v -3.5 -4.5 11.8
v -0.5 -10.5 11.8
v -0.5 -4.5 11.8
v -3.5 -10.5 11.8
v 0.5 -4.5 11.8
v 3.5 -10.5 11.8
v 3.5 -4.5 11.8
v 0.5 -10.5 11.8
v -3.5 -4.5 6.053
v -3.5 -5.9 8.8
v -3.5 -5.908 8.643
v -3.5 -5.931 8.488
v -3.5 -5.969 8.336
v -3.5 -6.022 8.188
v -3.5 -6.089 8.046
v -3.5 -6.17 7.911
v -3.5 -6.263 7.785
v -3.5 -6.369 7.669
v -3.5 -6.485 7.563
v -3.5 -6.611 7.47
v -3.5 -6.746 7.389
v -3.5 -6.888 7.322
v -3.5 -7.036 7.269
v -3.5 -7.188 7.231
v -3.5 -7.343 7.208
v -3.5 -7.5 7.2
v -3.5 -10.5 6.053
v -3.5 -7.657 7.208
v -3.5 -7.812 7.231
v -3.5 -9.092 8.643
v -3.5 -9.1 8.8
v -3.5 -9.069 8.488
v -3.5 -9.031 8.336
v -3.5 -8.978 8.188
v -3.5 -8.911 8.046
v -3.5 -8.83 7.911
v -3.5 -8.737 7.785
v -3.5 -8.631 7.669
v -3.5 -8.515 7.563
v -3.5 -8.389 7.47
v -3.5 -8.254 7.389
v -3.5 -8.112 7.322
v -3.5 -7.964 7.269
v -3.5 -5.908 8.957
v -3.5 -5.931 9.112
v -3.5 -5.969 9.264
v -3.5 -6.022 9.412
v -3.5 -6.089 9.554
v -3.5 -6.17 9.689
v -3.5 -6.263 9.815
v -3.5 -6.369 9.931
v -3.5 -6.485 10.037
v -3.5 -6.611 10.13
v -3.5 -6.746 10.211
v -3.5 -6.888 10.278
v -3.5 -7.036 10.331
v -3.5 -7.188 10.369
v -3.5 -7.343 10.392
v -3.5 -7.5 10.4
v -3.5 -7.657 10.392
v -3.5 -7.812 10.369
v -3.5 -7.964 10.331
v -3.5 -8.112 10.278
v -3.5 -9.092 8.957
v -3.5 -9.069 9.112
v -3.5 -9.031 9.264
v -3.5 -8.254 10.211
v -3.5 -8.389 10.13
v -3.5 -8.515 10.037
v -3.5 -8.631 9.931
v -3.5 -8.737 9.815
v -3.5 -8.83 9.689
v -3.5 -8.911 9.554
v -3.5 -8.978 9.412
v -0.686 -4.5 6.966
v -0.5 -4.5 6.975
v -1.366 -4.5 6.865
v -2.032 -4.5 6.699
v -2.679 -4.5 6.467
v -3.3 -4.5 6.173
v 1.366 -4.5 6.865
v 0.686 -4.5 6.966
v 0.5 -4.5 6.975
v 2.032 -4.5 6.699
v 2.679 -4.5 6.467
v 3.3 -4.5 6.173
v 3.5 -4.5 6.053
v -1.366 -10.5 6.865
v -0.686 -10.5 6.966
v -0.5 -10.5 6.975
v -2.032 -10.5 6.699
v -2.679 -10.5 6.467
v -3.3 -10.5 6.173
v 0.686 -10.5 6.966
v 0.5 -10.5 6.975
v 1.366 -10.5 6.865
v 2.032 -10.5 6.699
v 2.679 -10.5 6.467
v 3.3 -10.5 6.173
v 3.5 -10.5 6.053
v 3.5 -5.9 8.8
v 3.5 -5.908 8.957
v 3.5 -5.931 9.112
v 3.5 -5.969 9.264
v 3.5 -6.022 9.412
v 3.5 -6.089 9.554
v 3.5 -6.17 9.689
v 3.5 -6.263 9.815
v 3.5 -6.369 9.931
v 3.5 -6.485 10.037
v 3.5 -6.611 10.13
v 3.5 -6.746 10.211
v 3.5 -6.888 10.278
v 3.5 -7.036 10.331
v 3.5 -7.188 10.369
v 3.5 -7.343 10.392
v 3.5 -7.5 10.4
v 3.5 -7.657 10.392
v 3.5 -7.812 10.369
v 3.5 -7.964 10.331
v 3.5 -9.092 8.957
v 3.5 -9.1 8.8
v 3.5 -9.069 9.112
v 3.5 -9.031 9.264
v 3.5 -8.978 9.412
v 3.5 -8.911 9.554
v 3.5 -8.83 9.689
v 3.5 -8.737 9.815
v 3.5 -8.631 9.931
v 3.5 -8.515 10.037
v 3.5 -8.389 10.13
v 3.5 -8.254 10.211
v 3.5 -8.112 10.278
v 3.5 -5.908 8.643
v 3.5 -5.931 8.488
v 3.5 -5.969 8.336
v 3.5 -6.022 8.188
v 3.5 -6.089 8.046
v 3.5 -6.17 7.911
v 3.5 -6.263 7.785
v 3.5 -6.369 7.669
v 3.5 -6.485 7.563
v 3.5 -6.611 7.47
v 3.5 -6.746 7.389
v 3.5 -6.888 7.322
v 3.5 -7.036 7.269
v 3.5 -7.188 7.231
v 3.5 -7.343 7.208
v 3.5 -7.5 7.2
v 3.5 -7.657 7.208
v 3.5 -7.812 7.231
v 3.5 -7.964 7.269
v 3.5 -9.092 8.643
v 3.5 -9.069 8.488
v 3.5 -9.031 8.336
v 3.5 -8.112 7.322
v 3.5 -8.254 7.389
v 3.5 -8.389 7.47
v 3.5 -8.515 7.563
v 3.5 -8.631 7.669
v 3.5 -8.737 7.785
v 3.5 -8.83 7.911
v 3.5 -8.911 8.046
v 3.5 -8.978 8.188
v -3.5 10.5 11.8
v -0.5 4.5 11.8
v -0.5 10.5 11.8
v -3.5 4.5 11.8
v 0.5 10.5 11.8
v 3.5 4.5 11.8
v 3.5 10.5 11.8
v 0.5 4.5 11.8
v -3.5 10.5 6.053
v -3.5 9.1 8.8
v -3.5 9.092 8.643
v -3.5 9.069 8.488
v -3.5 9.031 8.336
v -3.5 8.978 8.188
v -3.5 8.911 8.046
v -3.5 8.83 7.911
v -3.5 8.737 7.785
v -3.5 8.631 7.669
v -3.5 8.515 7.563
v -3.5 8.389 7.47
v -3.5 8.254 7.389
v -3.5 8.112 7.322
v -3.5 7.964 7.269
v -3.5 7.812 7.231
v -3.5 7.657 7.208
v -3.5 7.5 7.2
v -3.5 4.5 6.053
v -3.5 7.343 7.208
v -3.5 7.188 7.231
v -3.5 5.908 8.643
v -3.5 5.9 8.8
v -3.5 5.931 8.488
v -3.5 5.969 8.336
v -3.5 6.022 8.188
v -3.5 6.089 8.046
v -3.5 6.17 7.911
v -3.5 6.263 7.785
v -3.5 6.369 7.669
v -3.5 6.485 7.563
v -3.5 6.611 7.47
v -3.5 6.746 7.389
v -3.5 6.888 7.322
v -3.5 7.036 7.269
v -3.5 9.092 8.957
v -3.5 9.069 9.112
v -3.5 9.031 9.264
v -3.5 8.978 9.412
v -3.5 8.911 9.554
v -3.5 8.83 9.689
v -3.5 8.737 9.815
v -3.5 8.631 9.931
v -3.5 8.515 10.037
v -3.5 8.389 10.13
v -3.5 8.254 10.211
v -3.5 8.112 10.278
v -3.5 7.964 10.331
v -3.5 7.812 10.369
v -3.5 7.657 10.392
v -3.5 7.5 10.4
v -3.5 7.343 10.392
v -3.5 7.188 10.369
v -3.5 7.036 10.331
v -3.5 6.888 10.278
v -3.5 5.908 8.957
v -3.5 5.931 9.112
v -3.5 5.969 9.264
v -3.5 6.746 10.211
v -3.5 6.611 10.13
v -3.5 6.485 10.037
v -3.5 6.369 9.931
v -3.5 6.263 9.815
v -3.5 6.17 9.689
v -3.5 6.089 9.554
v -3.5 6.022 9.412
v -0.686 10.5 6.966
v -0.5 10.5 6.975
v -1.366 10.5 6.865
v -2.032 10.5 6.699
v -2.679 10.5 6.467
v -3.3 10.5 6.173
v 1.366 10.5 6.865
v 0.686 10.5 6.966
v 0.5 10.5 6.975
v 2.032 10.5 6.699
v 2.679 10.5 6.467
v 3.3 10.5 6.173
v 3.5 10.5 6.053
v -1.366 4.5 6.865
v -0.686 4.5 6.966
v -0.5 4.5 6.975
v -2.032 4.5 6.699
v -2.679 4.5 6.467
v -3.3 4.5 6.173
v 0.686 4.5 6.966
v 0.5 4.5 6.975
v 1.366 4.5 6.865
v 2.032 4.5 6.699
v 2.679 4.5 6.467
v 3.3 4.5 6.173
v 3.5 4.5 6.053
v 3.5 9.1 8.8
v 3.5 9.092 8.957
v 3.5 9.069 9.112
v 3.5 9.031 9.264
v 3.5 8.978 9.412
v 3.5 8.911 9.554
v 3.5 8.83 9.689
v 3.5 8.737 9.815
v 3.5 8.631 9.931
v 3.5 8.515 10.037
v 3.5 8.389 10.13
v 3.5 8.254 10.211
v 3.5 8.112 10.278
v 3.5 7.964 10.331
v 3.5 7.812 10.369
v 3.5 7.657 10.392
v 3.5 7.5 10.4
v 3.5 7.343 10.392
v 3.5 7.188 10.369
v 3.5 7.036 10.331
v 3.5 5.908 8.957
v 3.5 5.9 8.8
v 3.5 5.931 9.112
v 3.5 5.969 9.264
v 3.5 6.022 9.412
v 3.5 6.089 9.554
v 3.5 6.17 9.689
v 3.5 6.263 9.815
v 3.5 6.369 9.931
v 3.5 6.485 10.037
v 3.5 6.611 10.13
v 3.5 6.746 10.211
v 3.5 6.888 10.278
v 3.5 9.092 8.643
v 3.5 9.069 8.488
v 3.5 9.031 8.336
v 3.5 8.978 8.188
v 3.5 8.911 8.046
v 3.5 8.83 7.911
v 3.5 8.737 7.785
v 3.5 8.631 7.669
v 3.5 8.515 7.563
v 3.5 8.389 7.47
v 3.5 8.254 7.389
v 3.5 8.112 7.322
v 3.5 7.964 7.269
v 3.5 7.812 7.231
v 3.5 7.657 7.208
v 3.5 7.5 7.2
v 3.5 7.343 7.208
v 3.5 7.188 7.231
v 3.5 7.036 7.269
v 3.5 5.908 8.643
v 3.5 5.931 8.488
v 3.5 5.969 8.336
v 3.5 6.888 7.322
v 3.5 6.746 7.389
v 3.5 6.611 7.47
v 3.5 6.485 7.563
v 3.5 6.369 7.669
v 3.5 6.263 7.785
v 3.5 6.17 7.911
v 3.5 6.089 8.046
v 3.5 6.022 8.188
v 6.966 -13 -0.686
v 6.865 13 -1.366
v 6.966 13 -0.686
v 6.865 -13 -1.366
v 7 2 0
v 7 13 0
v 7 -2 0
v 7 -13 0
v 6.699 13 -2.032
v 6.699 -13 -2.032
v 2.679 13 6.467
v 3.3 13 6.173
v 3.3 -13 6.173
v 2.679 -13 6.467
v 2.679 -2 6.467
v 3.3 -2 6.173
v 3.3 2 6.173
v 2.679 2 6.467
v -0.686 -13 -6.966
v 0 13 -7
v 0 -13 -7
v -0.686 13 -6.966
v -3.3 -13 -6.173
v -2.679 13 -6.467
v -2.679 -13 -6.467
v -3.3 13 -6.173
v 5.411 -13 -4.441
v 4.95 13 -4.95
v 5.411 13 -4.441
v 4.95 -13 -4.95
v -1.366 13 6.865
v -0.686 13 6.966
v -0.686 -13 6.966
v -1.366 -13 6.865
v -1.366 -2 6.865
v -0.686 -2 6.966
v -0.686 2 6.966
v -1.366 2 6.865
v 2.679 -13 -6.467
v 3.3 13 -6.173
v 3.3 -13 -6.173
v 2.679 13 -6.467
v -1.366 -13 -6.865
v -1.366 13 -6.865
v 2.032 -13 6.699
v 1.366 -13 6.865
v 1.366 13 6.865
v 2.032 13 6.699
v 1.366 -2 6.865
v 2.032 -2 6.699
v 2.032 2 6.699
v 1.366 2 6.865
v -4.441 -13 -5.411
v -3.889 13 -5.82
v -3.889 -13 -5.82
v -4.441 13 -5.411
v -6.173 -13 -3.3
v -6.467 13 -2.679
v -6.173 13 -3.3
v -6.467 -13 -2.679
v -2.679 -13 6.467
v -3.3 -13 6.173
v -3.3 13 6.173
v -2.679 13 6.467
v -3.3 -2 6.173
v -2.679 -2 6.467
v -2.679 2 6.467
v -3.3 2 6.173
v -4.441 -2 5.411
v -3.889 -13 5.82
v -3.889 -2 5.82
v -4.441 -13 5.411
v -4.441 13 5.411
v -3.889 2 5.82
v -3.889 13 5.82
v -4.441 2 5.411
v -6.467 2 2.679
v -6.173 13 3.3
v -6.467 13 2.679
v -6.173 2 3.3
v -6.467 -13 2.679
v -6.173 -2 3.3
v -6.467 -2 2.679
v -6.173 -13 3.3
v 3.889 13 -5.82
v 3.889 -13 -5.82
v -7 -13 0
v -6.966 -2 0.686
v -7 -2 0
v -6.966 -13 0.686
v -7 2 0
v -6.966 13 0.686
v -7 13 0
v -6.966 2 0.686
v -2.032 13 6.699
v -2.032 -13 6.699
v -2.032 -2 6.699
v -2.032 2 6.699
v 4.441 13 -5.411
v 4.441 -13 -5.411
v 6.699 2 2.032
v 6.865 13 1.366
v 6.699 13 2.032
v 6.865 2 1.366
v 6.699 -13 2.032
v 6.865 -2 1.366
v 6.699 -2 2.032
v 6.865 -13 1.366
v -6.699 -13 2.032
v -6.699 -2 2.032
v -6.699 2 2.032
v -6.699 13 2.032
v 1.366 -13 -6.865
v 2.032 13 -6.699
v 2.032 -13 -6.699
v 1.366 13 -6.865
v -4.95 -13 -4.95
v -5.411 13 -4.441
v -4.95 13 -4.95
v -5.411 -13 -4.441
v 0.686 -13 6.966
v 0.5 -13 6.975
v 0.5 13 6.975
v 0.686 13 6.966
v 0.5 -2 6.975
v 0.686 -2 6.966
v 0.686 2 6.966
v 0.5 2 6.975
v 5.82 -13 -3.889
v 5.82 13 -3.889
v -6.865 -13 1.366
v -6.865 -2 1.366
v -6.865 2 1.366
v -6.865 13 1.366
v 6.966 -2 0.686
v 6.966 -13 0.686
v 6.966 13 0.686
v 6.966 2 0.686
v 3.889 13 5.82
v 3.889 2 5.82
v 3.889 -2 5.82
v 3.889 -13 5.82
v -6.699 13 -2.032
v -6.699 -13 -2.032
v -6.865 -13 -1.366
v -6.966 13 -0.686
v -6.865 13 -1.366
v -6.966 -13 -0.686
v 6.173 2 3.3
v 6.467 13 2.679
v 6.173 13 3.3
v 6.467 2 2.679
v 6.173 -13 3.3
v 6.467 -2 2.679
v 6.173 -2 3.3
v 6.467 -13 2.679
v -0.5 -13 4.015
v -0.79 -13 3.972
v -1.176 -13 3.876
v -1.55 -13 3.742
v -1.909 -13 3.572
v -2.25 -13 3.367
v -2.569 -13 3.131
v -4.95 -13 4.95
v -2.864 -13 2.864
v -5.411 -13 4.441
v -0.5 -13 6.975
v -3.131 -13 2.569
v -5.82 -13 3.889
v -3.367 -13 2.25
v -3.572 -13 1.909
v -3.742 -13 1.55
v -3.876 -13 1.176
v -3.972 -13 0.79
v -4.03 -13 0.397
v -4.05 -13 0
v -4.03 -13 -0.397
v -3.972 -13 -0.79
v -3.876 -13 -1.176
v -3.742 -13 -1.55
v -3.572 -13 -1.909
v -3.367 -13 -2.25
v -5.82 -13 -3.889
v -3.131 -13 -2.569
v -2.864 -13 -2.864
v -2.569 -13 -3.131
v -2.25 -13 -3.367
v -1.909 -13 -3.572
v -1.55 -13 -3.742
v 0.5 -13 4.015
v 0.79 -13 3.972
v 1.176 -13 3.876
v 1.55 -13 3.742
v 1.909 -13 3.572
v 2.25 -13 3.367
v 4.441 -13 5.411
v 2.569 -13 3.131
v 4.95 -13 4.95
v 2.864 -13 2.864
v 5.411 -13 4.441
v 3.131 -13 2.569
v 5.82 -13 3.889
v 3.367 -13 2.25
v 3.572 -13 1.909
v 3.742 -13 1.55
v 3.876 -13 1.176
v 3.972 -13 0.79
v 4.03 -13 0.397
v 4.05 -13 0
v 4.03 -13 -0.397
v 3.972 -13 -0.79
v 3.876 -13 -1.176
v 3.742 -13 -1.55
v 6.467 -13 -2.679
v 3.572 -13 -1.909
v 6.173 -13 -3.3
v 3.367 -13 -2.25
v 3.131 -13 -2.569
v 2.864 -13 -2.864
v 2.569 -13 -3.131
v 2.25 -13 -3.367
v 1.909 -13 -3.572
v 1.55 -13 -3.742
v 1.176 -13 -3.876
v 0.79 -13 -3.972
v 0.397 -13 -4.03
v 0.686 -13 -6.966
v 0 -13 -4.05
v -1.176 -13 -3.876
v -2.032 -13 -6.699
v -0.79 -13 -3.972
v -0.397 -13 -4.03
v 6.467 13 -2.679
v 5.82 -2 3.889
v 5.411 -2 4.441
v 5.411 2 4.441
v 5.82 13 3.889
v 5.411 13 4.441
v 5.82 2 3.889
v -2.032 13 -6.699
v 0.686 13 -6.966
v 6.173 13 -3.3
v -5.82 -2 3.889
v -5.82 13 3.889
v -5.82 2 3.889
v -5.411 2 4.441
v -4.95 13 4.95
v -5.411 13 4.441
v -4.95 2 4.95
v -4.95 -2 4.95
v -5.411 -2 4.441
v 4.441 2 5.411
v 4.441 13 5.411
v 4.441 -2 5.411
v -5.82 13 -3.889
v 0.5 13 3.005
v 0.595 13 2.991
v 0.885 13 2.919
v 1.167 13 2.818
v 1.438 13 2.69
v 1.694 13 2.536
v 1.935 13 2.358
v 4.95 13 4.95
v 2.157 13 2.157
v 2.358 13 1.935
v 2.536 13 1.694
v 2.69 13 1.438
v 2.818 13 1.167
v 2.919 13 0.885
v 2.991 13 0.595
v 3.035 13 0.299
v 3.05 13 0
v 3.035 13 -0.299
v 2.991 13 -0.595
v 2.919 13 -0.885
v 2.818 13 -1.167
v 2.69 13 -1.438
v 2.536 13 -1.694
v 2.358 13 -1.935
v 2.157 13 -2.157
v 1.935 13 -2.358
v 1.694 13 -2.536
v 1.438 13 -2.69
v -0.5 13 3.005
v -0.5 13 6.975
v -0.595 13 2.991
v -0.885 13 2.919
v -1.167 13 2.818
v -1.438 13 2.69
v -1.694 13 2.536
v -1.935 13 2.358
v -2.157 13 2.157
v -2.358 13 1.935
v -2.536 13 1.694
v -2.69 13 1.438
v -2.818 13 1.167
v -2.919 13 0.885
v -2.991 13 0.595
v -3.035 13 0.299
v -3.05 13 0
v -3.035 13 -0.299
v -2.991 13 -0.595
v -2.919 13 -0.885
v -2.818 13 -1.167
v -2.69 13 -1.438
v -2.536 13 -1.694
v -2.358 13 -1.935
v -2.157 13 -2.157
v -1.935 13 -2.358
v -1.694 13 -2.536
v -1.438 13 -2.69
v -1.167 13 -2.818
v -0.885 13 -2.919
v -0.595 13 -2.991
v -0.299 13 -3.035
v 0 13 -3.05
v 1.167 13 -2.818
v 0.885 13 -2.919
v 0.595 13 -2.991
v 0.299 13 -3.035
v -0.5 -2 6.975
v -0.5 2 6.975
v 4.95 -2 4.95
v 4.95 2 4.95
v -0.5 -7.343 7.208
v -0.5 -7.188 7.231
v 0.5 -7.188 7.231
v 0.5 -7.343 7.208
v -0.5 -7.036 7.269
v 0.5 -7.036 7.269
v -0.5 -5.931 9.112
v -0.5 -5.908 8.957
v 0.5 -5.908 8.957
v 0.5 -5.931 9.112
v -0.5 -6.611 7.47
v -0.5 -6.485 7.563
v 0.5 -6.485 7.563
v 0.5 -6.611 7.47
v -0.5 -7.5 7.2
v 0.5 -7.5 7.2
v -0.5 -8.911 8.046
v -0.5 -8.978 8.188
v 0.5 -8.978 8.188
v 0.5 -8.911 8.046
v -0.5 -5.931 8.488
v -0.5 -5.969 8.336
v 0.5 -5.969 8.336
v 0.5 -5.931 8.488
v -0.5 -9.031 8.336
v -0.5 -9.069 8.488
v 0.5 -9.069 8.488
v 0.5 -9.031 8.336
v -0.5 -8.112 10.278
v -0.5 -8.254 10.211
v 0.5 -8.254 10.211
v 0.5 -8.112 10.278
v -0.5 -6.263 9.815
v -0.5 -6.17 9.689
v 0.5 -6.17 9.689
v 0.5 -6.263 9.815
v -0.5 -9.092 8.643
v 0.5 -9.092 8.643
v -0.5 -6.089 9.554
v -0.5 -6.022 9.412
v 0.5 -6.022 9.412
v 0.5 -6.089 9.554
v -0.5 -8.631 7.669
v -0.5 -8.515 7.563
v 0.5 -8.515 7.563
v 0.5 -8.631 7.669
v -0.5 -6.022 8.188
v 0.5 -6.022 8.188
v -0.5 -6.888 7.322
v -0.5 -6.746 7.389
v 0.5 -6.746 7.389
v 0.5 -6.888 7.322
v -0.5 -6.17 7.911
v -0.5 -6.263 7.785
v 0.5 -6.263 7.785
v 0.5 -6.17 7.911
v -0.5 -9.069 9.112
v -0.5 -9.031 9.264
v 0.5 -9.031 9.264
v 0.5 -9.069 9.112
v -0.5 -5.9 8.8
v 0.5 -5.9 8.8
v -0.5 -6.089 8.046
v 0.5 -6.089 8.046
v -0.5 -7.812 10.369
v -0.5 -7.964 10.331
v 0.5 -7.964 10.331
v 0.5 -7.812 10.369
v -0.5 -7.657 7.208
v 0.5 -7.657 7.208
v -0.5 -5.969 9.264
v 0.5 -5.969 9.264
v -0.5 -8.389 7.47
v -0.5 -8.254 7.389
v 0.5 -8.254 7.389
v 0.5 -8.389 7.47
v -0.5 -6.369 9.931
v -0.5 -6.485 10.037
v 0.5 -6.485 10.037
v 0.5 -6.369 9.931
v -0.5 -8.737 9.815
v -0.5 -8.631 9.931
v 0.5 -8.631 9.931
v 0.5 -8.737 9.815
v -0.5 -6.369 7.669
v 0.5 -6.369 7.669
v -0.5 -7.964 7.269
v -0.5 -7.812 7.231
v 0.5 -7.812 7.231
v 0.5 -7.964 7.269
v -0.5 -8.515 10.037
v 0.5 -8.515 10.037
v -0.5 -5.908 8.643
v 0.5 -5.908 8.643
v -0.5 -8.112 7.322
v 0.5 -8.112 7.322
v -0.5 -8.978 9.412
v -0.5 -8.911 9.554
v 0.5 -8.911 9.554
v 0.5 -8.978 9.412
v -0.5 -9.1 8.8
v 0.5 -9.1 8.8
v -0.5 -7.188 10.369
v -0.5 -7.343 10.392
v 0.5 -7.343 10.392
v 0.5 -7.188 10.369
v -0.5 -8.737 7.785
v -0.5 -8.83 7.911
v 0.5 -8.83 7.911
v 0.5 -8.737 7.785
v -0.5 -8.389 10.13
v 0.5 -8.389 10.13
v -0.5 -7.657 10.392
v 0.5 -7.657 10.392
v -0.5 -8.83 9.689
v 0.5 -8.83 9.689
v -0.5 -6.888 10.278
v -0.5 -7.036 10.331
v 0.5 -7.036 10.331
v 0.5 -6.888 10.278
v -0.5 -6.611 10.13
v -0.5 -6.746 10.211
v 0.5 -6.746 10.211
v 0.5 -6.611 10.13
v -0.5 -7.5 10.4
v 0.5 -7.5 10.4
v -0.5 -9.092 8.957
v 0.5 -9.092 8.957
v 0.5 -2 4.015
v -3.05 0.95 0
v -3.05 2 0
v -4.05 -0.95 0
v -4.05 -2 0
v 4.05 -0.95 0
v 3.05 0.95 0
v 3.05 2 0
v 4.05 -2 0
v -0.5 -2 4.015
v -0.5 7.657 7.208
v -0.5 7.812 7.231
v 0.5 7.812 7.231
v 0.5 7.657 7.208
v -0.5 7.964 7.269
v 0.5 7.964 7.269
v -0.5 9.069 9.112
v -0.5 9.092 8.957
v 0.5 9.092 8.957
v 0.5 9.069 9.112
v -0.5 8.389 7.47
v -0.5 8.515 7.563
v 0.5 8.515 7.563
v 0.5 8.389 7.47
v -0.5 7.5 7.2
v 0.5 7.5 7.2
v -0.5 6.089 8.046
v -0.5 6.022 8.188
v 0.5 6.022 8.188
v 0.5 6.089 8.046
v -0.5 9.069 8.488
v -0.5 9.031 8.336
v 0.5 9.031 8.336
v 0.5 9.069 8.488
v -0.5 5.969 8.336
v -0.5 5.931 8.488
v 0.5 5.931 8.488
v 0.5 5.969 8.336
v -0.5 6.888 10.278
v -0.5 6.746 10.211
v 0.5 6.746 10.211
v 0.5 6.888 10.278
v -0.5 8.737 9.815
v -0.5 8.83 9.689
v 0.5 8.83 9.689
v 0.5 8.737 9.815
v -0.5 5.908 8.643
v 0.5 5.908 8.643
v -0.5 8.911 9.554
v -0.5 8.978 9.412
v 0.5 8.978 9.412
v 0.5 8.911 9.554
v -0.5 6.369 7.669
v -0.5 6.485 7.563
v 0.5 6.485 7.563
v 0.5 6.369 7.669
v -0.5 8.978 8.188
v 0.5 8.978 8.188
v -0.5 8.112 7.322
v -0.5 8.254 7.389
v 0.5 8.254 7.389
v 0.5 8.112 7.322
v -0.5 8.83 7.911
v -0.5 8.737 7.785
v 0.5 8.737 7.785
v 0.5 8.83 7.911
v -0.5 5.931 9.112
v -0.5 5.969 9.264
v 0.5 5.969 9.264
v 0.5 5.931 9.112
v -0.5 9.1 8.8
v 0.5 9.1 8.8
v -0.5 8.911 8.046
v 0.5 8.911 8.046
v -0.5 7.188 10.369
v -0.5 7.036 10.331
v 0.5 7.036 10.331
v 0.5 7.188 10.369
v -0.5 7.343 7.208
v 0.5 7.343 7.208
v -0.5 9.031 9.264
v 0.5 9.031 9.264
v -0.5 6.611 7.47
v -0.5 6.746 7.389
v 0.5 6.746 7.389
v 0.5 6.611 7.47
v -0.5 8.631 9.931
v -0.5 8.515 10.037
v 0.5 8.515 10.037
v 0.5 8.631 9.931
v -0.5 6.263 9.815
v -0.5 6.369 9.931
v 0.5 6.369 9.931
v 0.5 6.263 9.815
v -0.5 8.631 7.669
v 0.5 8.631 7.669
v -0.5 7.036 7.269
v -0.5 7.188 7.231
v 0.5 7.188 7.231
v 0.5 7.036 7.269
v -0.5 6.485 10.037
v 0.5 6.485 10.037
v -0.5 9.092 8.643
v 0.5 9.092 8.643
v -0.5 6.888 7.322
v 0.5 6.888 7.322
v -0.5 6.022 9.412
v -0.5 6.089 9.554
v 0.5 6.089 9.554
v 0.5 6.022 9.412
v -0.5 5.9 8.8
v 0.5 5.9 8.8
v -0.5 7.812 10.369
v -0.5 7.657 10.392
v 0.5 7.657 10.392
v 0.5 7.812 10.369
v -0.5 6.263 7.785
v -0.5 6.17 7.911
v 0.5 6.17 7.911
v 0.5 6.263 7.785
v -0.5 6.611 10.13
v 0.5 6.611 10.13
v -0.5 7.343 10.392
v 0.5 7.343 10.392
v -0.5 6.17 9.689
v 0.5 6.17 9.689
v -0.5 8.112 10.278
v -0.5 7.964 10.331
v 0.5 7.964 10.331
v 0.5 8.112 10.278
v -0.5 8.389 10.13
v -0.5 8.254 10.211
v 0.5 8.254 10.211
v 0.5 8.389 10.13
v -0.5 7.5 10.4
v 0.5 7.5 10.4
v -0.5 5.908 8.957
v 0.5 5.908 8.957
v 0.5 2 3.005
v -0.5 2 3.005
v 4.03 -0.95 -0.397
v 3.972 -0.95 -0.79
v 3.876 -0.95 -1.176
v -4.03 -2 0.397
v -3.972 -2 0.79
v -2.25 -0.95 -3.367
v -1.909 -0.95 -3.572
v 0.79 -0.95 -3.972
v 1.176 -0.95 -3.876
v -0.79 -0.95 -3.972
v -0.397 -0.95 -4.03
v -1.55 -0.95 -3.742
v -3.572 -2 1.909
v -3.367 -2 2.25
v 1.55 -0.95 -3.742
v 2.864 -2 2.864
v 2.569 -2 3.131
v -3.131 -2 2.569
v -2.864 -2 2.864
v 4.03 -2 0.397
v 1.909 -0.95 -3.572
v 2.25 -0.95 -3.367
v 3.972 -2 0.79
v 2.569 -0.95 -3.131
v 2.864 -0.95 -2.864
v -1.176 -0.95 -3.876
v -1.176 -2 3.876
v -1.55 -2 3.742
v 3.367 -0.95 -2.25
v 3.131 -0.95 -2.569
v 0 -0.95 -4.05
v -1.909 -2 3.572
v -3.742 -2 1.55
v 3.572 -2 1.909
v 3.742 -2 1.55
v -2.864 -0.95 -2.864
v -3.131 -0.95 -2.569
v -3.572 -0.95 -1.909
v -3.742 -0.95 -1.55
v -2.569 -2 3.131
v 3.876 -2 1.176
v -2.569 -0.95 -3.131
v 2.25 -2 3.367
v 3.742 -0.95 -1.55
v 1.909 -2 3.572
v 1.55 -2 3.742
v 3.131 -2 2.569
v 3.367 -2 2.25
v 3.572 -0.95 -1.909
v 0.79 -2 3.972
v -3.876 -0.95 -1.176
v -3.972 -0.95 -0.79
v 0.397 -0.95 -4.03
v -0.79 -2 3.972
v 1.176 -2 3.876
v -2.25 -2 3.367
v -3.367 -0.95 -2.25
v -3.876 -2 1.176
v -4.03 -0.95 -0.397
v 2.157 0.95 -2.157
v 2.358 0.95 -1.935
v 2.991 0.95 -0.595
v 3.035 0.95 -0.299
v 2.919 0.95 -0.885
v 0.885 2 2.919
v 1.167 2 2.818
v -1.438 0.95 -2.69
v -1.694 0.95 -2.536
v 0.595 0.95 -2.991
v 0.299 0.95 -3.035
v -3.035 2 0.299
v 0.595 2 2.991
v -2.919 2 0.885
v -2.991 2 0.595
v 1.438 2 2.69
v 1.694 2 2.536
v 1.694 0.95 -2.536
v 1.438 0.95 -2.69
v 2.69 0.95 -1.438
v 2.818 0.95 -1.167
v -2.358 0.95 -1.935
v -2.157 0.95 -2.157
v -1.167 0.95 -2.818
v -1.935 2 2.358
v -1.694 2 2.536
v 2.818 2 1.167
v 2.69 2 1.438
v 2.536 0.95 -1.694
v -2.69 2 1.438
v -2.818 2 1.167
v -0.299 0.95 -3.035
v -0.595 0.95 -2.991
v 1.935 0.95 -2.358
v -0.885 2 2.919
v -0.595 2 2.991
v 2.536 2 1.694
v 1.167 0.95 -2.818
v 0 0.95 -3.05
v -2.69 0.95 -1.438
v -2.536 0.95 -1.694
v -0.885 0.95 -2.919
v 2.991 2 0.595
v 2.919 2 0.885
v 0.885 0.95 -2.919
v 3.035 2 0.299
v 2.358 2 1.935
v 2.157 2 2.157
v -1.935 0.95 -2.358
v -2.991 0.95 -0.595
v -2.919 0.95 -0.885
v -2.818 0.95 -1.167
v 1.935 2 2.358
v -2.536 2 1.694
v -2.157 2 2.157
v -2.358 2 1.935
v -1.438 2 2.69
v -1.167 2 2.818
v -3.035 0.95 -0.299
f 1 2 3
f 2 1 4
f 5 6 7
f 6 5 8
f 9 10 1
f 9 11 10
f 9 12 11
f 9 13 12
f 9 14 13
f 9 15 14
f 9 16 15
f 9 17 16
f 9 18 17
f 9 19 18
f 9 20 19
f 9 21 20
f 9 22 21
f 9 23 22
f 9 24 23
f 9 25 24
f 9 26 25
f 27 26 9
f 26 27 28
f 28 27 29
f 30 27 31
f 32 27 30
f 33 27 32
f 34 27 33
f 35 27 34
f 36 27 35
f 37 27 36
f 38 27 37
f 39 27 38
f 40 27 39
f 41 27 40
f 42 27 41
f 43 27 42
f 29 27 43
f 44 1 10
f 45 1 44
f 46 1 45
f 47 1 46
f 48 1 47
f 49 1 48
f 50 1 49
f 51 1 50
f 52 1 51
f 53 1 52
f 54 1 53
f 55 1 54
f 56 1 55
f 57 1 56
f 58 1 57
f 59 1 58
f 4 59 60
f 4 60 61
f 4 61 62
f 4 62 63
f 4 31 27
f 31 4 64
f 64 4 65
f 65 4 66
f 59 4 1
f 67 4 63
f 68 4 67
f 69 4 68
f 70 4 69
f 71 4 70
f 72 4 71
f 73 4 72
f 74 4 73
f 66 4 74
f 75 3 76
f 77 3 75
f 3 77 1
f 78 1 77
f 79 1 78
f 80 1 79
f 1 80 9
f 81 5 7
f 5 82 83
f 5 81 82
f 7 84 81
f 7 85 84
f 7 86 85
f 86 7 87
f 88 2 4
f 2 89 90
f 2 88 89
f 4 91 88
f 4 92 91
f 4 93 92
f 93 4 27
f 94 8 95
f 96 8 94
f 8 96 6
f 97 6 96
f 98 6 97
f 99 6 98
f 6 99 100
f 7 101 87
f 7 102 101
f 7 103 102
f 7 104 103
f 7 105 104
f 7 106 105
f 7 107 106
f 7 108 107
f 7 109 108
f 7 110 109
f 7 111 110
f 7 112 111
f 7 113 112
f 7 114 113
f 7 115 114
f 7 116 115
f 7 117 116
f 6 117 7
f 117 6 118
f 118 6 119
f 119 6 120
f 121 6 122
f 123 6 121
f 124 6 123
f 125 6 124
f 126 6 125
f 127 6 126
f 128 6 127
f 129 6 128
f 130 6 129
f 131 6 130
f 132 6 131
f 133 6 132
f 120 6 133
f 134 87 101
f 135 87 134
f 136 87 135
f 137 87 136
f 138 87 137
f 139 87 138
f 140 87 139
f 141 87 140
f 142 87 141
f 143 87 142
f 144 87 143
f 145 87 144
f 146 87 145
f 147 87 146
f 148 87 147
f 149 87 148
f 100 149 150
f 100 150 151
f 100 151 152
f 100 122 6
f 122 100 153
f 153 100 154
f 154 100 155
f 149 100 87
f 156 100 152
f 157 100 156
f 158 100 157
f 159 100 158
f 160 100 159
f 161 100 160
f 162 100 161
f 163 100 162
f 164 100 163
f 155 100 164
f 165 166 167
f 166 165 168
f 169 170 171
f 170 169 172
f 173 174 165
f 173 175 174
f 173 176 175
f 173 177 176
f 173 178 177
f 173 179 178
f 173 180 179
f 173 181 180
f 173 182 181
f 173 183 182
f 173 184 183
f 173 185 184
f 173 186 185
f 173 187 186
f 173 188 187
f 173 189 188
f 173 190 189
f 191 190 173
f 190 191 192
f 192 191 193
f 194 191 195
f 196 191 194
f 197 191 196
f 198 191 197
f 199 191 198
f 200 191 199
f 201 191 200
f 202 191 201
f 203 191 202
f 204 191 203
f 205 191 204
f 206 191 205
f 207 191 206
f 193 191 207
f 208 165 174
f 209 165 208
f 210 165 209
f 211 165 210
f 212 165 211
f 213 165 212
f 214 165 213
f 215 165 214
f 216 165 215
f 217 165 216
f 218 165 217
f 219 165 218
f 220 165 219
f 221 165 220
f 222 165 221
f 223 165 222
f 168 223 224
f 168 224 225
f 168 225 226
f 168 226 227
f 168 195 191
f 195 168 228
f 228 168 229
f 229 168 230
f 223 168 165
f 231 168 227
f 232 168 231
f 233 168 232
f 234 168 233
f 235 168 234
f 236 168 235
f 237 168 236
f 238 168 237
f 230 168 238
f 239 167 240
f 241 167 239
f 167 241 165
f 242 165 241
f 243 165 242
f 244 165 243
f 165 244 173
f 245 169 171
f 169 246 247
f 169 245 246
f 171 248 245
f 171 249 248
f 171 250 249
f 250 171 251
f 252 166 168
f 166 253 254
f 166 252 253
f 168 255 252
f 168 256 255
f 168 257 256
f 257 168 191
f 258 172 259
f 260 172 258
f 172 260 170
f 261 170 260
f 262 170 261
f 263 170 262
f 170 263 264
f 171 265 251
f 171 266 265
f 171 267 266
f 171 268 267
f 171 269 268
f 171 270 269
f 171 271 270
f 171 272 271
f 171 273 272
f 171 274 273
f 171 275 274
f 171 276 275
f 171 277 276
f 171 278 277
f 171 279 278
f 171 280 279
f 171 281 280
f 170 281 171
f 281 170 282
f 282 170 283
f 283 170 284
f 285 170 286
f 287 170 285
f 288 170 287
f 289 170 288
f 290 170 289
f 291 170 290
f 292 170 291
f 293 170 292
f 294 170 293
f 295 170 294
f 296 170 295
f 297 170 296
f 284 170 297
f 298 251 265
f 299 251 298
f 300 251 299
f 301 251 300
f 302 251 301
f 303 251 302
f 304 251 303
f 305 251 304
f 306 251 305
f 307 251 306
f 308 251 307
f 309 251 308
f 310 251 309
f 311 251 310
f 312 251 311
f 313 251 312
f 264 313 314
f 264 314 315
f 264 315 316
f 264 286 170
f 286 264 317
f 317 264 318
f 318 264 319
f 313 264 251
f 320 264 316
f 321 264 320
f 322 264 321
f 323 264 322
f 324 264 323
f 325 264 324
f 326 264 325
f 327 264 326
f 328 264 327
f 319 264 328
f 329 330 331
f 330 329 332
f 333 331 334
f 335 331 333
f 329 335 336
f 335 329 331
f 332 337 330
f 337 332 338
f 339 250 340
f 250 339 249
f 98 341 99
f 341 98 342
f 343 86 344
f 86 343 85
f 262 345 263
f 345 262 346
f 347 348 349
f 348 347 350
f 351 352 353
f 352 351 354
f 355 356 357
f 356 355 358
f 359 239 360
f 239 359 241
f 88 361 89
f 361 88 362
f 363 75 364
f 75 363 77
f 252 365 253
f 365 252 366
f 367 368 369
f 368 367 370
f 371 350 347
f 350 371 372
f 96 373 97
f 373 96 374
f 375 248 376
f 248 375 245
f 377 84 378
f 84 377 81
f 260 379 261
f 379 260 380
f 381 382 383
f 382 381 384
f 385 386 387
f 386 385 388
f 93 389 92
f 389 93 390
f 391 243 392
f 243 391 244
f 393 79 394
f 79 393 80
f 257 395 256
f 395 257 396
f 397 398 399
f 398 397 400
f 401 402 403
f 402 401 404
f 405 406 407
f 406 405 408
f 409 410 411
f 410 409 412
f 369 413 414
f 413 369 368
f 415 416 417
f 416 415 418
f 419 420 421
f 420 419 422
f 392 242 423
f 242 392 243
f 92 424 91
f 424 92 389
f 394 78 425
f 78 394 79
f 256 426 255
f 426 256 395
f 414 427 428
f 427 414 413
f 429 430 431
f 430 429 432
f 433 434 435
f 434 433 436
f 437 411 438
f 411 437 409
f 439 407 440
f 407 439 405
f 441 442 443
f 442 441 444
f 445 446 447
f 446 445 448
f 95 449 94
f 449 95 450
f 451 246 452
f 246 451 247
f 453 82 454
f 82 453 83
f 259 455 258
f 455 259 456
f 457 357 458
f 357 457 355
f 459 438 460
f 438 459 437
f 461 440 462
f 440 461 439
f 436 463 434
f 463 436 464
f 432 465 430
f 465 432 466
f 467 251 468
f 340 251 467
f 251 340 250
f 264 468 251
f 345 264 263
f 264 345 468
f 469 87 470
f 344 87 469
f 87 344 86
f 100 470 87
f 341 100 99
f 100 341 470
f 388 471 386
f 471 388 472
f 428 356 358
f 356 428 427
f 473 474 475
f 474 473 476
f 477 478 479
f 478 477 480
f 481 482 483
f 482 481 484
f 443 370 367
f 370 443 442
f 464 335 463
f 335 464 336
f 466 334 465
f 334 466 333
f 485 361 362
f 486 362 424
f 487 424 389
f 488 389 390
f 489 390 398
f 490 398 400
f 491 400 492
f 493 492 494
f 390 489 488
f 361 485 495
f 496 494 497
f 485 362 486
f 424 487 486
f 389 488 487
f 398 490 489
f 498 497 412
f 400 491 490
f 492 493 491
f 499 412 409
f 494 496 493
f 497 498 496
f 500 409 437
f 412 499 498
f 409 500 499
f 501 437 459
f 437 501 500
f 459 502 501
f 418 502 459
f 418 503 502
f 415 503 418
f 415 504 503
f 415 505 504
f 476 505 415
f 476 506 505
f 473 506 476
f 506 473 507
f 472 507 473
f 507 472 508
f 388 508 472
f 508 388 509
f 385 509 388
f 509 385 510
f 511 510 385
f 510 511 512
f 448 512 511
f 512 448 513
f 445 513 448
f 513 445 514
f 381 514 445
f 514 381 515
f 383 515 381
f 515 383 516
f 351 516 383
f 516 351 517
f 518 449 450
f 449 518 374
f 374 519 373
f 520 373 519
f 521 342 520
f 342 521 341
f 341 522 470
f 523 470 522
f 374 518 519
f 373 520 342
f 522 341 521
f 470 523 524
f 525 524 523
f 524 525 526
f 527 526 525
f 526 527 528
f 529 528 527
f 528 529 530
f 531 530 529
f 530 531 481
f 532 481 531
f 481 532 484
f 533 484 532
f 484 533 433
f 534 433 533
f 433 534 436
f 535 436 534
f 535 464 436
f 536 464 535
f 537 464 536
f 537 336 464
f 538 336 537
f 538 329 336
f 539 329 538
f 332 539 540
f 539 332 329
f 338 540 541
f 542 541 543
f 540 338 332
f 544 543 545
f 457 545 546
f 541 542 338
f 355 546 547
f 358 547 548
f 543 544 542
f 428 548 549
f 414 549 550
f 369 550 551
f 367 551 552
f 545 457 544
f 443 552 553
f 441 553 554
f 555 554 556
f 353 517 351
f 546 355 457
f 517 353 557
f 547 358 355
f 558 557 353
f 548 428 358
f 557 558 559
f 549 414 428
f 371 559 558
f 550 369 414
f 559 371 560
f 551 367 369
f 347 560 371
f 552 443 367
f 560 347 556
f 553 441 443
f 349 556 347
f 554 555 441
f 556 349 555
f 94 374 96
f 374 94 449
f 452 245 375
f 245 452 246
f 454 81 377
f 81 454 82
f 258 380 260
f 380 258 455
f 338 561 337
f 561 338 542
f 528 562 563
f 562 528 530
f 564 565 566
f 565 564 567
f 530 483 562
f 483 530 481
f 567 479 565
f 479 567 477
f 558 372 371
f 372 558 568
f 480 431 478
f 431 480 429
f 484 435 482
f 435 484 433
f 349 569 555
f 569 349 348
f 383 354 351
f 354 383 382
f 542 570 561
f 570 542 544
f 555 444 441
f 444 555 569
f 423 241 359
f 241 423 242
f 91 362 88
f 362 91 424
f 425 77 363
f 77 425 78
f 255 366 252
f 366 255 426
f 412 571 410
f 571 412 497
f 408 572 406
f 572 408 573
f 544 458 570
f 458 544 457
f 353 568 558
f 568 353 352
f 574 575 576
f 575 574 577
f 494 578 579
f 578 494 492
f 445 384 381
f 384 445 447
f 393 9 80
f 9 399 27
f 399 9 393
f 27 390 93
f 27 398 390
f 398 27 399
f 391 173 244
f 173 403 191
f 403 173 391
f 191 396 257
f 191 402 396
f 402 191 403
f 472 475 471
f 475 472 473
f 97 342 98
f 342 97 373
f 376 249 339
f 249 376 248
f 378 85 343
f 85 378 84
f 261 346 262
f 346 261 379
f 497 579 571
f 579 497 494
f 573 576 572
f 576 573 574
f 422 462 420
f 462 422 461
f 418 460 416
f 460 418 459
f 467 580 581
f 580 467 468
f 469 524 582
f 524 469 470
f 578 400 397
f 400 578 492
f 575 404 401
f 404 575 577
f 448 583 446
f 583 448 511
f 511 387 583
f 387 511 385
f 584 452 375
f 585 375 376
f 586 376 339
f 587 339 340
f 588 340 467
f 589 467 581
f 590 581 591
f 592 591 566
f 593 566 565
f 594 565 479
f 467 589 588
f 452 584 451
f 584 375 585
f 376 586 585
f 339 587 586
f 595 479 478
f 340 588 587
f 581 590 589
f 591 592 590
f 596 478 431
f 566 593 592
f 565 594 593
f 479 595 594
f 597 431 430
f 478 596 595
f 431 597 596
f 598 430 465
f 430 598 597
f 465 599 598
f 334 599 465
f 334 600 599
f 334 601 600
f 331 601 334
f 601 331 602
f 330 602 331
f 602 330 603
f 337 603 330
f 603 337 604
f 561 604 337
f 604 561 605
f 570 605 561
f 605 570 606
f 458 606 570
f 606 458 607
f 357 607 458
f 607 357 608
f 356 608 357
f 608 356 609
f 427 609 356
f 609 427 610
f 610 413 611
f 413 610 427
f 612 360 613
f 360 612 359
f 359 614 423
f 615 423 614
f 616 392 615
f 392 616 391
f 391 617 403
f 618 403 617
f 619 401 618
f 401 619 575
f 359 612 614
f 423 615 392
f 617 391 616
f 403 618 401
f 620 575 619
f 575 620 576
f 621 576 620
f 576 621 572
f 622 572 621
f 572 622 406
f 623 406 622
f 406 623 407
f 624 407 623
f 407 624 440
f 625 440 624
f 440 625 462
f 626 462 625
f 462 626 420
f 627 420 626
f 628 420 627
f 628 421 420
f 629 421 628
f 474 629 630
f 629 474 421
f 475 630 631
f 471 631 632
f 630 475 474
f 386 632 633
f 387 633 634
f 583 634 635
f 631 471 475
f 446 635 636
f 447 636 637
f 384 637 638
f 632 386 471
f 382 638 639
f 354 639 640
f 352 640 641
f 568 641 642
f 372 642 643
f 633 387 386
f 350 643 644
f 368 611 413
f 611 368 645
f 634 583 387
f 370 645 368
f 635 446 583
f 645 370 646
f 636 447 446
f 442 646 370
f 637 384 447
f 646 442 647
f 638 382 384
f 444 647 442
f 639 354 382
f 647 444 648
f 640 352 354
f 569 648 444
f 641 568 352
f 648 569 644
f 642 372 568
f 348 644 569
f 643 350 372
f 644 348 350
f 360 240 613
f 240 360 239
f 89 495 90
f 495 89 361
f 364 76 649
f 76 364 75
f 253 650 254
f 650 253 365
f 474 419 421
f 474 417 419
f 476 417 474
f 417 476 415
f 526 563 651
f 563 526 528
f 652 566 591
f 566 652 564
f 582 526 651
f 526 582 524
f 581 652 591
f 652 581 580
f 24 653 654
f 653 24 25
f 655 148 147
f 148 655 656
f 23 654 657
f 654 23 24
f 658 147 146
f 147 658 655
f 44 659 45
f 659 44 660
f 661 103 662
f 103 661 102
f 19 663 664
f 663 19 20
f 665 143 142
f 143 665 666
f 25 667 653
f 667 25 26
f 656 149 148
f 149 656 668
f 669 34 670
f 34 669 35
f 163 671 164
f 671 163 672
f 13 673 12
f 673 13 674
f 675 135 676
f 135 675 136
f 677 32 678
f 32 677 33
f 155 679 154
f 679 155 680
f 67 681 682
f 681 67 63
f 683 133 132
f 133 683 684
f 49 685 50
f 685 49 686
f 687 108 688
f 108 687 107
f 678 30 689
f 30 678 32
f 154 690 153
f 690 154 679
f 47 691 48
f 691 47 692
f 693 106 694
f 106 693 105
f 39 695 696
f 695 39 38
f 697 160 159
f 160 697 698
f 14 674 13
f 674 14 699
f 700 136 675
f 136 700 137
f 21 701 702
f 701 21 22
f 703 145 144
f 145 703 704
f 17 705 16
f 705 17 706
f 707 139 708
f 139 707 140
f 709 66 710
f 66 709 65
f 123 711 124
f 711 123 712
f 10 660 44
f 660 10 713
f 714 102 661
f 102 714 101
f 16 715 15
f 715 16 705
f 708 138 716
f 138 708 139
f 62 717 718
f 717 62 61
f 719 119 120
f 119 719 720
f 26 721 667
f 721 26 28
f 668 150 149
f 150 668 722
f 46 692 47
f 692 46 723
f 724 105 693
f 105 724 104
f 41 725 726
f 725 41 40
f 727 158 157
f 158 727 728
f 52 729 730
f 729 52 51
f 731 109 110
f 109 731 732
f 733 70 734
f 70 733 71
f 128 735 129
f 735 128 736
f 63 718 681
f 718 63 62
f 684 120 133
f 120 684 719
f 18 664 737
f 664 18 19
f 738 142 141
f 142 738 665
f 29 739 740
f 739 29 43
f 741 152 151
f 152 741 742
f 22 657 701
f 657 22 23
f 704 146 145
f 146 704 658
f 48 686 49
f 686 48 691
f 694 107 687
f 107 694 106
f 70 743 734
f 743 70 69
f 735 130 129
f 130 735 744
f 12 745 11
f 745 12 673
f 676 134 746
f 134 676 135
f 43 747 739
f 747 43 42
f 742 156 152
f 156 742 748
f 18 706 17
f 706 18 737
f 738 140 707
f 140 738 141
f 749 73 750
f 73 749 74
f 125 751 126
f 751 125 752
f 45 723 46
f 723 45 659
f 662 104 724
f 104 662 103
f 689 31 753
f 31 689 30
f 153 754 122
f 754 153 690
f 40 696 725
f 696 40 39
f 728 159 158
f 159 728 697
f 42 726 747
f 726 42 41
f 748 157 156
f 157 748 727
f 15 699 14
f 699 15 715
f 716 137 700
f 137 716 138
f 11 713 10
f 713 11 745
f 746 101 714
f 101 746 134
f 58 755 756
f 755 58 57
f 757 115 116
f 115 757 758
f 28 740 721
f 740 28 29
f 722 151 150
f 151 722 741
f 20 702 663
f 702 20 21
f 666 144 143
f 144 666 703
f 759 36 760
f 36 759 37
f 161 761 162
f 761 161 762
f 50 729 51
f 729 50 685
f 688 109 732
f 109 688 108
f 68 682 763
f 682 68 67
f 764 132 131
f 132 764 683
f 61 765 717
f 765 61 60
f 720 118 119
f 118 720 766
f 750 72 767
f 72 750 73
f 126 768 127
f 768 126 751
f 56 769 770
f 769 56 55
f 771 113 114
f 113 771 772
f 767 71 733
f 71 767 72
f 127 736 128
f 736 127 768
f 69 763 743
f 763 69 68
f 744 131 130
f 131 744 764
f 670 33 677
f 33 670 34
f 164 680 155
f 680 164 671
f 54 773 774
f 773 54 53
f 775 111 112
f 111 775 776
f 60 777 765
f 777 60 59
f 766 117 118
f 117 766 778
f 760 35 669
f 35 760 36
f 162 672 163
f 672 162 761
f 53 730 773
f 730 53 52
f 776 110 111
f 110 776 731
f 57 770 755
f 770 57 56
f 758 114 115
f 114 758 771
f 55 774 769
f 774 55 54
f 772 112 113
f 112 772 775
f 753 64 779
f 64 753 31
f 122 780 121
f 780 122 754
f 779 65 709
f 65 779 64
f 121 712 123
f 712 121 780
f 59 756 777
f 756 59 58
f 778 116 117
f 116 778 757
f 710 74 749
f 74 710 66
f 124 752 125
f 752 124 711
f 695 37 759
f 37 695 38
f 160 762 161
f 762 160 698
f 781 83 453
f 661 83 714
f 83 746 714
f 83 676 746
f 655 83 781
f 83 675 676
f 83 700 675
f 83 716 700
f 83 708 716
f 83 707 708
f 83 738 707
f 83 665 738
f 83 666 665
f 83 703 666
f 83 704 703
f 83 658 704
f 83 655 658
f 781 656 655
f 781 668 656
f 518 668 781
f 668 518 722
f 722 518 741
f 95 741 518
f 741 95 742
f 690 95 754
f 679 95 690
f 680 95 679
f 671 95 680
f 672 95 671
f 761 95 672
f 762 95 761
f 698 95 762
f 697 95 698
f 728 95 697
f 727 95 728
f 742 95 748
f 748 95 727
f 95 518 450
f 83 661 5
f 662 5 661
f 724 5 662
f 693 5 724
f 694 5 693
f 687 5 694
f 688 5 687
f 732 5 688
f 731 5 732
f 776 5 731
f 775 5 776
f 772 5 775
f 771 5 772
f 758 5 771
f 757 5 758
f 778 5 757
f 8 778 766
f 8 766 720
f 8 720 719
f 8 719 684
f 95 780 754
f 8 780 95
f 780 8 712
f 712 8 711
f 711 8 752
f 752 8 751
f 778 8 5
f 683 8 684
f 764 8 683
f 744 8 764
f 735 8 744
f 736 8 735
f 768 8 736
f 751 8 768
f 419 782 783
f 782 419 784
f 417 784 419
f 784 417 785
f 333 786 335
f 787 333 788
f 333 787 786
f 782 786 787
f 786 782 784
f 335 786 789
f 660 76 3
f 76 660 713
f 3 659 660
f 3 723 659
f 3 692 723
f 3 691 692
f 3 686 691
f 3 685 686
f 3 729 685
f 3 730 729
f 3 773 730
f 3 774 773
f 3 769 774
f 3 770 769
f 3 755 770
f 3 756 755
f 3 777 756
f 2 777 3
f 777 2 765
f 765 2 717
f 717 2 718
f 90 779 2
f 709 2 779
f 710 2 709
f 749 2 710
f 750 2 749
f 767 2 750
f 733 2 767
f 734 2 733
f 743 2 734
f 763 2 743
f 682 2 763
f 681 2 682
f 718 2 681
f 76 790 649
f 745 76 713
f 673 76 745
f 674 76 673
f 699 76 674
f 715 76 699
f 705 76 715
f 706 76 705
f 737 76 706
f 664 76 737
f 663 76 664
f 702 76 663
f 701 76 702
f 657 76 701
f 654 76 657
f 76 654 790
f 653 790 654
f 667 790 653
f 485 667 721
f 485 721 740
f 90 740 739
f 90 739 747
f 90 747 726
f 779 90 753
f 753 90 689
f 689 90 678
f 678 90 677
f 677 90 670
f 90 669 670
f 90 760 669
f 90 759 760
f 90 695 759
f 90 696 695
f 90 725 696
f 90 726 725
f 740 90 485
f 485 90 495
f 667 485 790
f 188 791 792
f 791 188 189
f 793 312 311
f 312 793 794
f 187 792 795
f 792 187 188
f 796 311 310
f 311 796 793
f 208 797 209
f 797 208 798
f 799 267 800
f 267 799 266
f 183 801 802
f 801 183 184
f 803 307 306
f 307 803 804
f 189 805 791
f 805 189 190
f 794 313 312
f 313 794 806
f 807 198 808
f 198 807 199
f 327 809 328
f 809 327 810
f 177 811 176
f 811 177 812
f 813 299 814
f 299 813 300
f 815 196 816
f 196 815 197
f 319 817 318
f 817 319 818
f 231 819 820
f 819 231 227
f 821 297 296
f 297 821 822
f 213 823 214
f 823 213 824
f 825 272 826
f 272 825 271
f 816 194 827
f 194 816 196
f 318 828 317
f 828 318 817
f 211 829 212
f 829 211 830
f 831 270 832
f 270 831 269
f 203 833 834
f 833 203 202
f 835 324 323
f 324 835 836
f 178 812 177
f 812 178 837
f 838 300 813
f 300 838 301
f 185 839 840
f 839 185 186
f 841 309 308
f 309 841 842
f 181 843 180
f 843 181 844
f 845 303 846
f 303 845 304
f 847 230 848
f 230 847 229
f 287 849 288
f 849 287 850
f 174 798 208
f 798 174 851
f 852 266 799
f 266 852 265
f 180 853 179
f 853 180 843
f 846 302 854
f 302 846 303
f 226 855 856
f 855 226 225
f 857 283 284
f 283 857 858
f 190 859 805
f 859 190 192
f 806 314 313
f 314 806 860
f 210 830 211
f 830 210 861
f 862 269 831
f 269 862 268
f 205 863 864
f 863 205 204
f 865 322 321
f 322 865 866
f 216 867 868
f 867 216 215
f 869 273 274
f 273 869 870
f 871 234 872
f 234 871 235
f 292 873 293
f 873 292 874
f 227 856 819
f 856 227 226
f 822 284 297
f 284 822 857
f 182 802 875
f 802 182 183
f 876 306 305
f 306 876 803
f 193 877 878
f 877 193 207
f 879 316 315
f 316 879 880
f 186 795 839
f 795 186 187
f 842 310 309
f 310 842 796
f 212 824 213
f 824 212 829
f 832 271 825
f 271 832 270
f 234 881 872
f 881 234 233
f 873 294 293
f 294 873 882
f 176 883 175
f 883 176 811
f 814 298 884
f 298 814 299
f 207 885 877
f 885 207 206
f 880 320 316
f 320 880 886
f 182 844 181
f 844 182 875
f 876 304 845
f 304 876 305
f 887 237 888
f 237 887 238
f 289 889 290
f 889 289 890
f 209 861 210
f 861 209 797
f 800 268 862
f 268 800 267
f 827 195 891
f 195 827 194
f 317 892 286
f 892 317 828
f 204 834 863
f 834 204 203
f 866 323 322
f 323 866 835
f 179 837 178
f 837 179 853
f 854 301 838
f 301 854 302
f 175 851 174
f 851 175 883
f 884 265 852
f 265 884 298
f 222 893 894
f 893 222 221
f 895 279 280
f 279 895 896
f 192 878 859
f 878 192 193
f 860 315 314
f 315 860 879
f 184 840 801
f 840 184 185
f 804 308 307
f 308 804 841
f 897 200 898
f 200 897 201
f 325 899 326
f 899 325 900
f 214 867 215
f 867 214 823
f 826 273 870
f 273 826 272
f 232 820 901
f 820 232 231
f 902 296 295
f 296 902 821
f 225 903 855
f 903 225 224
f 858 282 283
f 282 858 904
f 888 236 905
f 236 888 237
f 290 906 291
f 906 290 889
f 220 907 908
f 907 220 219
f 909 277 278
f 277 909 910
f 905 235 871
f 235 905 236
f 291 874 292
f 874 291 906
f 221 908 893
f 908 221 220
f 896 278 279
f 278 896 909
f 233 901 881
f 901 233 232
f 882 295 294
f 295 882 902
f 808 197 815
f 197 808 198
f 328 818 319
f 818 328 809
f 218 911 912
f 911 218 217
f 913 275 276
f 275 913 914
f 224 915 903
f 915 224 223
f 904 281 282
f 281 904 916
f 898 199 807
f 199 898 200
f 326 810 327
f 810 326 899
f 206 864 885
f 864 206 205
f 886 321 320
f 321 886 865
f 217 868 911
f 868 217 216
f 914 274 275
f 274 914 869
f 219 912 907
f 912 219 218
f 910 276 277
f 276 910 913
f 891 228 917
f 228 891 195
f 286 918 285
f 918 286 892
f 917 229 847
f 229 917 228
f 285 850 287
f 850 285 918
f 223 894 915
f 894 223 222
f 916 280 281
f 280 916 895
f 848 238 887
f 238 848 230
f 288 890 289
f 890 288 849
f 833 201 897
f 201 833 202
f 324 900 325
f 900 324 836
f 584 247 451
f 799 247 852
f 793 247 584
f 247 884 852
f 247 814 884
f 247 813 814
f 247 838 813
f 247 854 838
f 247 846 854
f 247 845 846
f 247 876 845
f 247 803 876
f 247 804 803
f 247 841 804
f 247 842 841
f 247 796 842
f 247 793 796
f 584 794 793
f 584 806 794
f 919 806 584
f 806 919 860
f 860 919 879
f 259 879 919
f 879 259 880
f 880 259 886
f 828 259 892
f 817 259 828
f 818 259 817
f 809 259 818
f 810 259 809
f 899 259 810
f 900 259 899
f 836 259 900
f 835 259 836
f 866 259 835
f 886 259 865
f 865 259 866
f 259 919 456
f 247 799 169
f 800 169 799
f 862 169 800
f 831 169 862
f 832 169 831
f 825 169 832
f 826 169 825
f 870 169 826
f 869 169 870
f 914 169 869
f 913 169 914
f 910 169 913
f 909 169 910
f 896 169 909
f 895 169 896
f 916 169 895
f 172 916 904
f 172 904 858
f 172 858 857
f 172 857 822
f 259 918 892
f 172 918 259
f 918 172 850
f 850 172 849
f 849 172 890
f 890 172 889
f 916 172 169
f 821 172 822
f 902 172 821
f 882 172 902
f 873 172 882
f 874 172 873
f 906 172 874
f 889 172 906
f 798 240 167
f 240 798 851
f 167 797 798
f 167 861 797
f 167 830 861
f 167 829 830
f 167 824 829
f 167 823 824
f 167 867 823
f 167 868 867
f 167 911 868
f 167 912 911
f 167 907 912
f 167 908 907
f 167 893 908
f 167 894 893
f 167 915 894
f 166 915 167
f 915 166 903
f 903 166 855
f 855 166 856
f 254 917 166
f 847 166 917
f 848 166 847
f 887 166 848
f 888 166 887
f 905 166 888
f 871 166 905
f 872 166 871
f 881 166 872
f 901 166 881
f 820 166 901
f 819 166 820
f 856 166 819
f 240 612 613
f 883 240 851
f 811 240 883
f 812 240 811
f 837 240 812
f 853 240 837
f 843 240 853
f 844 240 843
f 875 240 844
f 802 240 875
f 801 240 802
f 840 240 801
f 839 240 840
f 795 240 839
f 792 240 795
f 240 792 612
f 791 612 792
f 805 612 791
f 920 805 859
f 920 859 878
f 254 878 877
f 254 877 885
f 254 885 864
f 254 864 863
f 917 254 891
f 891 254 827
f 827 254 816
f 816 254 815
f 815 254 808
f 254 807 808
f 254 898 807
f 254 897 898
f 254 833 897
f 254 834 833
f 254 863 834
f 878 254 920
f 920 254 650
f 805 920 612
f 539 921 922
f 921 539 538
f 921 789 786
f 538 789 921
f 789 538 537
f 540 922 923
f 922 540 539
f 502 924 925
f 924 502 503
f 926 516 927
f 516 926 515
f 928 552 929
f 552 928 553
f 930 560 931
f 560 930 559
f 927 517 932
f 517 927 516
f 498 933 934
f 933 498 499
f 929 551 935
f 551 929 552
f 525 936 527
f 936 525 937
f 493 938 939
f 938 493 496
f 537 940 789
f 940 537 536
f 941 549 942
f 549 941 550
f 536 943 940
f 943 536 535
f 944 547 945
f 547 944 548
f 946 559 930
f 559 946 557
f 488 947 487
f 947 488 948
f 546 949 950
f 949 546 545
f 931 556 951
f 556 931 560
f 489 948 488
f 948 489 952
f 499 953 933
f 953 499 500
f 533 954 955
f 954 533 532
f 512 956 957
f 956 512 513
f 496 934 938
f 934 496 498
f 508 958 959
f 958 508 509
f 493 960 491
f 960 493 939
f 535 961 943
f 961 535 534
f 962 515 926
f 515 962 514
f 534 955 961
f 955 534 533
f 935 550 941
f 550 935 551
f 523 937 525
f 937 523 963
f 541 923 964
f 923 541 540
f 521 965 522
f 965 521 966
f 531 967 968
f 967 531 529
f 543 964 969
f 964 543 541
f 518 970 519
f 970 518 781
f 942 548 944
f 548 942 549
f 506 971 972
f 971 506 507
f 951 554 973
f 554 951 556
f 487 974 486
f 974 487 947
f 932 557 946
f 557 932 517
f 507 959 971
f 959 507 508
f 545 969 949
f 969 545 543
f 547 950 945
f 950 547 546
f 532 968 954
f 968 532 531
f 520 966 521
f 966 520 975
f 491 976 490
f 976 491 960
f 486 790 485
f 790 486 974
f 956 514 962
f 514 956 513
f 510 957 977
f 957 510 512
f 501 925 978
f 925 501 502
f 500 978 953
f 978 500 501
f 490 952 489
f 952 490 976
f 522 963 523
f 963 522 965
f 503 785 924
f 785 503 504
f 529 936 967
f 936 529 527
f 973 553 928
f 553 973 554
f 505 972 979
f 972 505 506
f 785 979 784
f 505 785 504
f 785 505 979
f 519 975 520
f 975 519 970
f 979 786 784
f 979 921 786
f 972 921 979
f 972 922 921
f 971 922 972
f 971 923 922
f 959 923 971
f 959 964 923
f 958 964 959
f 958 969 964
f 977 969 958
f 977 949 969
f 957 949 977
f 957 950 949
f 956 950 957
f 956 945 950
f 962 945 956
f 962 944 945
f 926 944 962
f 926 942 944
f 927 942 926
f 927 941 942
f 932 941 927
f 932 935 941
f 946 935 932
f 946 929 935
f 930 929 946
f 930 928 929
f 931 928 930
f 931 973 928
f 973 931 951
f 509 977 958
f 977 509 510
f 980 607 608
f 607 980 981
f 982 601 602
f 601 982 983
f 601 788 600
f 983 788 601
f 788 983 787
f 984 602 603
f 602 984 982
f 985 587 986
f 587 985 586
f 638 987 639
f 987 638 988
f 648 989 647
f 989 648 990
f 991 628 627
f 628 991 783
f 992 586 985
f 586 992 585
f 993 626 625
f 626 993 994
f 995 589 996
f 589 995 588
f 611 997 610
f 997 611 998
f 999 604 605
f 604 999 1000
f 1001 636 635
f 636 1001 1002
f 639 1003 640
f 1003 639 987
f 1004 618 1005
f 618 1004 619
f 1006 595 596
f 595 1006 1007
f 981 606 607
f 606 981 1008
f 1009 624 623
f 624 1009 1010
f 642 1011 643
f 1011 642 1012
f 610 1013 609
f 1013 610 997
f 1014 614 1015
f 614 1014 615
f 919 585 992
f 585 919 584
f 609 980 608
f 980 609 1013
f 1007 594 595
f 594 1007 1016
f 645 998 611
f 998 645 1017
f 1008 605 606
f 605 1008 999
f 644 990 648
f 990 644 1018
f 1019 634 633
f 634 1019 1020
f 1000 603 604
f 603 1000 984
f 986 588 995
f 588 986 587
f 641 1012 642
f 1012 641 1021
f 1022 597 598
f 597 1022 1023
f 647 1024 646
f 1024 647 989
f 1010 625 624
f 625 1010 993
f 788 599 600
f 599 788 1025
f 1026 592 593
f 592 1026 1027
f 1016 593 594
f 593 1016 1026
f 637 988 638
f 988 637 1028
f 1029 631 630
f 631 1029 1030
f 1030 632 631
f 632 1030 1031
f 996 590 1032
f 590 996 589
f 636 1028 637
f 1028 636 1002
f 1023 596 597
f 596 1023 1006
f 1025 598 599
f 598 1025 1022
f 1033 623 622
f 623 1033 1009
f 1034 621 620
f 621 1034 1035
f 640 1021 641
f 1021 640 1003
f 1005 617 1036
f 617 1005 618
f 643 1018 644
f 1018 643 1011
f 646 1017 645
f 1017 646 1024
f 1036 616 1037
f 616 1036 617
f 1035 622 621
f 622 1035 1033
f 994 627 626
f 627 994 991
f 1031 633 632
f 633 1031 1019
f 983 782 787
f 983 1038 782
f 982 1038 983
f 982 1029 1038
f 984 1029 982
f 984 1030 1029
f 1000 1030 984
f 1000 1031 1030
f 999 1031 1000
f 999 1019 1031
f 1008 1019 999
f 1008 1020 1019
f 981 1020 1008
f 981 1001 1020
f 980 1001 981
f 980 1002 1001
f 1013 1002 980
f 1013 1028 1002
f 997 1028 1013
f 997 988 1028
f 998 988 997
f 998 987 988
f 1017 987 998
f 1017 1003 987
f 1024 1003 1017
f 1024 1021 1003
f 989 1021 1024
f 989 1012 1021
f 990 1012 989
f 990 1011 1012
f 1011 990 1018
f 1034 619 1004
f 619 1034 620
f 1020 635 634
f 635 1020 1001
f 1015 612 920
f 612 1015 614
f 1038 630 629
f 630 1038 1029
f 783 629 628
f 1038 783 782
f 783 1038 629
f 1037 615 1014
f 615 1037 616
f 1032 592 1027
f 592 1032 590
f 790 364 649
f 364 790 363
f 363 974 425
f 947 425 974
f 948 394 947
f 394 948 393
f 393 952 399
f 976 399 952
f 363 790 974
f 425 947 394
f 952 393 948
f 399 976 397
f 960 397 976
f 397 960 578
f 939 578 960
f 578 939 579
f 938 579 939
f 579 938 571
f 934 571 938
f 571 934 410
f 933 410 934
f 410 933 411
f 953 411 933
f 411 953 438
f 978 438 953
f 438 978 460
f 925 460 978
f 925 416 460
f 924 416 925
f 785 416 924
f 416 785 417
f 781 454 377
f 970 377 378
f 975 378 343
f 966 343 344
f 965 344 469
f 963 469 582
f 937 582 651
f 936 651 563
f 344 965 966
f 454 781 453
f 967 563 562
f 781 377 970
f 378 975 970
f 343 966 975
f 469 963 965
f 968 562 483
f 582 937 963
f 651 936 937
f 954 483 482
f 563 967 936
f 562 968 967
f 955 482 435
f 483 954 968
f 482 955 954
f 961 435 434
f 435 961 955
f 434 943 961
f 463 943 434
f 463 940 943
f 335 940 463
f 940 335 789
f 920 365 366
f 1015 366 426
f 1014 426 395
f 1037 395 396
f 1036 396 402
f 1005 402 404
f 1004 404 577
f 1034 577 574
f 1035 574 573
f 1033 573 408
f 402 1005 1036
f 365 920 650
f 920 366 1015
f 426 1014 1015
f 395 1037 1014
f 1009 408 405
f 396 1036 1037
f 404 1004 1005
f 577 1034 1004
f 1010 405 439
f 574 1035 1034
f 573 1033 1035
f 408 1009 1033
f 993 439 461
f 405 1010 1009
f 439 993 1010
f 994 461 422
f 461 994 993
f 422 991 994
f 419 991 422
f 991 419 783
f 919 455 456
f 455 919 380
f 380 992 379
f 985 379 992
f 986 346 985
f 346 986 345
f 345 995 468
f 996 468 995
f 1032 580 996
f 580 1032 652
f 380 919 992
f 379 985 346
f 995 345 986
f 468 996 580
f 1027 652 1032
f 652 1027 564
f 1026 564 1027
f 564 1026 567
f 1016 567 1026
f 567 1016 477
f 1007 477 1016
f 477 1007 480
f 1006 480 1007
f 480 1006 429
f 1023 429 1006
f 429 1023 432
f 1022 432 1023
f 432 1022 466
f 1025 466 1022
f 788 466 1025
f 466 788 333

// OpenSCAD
// Standalone solid coupler part.
// Edit shared dimensions in frame_v3.scad so the assembly and this part stay linked.

part_mode = "solid_coupler";
part_cutaway = false;      // true shows the stepped blind bores and center stop
print_export = true;       // use high quality $fn for STL export

include <frame_v3.scad>
